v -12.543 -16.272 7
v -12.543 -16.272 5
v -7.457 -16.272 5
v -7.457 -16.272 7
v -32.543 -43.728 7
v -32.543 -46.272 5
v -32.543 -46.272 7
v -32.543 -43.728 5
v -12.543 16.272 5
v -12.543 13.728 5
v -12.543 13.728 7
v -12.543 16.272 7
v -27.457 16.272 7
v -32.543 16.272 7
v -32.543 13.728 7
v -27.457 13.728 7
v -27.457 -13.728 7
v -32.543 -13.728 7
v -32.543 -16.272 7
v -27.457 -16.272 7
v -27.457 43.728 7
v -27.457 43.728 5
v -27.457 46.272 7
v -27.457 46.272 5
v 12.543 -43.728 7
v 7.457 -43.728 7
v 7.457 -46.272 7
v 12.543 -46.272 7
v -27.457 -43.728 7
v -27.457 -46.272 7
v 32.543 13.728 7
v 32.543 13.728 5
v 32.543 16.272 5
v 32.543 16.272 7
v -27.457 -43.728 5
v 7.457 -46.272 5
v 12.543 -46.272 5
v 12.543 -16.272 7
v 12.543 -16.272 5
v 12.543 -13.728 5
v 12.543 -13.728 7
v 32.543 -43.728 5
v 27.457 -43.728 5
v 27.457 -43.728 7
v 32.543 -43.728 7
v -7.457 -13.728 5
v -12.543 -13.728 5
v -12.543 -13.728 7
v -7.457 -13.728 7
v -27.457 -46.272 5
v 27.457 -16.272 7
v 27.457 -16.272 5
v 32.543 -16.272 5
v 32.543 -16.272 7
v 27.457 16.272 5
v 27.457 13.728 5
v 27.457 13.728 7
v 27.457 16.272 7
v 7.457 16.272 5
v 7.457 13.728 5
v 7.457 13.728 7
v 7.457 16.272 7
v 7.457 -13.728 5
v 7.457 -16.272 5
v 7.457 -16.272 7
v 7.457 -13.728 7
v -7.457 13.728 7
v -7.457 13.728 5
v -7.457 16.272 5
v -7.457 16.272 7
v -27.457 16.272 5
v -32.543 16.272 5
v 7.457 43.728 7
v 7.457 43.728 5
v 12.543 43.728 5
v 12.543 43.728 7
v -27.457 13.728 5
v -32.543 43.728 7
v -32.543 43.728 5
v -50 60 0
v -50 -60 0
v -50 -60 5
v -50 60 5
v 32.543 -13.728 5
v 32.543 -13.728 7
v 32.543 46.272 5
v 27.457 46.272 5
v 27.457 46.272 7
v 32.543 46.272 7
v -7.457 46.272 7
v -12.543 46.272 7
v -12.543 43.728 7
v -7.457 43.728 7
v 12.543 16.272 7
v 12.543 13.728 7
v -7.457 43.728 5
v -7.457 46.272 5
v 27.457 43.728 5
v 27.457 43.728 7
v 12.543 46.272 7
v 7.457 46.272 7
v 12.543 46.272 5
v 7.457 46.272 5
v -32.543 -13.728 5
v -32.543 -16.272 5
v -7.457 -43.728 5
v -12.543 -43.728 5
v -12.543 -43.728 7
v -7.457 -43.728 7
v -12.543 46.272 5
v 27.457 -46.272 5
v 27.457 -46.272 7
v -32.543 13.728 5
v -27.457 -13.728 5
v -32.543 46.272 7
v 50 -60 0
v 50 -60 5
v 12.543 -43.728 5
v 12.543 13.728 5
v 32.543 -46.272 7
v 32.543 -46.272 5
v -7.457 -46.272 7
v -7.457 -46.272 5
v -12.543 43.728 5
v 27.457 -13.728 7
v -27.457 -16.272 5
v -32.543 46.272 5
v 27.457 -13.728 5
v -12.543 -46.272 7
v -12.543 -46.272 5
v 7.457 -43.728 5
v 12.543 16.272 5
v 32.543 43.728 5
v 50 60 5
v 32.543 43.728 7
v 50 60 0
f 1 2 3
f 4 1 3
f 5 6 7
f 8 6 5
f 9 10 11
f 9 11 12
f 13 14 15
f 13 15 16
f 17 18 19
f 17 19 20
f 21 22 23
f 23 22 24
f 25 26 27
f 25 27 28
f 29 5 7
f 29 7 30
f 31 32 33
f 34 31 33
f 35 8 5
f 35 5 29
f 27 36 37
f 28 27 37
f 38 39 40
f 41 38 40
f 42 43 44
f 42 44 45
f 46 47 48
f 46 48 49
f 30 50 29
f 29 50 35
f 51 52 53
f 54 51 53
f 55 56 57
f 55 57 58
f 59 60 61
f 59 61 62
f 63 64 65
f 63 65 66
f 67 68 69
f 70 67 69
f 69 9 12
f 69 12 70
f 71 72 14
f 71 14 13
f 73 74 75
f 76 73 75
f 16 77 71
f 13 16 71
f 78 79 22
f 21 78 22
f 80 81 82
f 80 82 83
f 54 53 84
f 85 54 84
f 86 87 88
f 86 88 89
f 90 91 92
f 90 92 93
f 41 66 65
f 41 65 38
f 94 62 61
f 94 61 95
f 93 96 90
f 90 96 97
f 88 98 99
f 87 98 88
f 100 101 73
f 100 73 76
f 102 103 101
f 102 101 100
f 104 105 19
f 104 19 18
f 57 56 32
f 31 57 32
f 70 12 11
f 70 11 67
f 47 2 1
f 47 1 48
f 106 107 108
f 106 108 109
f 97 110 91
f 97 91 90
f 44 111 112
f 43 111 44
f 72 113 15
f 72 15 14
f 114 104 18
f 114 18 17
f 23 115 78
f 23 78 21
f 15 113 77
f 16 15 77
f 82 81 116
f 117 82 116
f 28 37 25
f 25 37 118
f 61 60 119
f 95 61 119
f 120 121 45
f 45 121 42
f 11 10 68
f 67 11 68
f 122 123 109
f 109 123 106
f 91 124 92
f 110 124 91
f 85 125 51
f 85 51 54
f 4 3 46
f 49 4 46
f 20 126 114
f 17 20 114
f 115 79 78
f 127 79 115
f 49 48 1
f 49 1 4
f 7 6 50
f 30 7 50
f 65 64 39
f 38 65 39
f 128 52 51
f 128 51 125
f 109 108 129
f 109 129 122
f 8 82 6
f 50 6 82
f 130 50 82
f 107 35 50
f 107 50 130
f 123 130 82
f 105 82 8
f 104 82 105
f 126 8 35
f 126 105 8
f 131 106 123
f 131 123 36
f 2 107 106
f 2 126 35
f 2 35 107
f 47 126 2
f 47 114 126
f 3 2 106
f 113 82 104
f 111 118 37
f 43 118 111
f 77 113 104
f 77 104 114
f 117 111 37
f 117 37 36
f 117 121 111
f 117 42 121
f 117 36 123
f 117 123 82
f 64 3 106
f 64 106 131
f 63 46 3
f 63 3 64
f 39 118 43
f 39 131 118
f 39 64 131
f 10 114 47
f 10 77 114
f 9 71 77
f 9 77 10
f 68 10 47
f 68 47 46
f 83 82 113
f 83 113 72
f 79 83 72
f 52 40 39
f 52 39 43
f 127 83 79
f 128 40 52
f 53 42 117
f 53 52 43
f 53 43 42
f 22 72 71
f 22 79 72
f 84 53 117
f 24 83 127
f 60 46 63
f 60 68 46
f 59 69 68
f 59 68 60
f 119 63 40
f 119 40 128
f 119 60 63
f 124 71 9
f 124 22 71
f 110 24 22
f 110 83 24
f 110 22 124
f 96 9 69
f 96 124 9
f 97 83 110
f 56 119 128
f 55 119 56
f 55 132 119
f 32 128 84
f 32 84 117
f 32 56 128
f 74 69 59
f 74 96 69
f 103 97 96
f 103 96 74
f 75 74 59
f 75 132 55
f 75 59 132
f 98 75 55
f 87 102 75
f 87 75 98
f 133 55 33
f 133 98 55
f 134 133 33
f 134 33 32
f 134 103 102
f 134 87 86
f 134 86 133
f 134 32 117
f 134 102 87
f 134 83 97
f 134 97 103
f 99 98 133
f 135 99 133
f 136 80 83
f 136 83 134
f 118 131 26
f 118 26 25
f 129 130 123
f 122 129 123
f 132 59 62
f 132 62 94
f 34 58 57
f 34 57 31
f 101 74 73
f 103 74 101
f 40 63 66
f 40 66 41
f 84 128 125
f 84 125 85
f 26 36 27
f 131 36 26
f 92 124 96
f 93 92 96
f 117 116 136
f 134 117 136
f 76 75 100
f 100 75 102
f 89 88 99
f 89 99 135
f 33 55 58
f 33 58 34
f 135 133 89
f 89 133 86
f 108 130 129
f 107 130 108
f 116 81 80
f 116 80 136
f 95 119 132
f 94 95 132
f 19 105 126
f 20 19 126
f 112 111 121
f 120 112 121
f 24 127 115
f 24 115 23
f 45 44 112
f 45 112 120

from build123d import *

# Parameters (mm, degrees)
SKETCH_1_W      = 100
SKETCH_1_H      = 120
EXTRUDE_1_DEPTH = 5
SKETCH_2_W      = 5.086017552
SKETCH_2_H      = 2.543008776
EXTRUDE_2_DEPTH = 2


with BuildPart() as part:
    # 草图1 → 凸台-拉伸1 (new body)
    with BuildSketch(Plane.XY):
        Rectangle(SKETCH_1_W, SKETCH_1_H)
    extrude(amount=EXTRUDE_1_DEPTH)

    # 草图2 → 凸台-拉伸2 (add)
    with BuildSketch(Plane.XY.offset(5)):
        with Locations((-10, 45)):
            Rectangle(SKETCH_2_W, SKETCH_2_H)
        with Locations((-30, 45)):
            Rectangle(SKETCH_2_W, SKETCH_2_H)
        with Locations((10, 45)):
            Rectangle(SKETCH_2_W, SKETCH_2_H)
        with Locations((30, 45)):
            Rectangle(SKETCH_2_W, SKETCH_2_H)
        with Locations((-30, 15)):
            Rectangle(SKETCH_2_W, SKETCH_2_H)
        with Locations((-10, 15)):
            Rectangle(SKETCH_2_W, SKETCH_2_H)
        with Locations((10, 15)):
            Rectangle(SKETCH_2_W, SKETCH_2_H)
        with Locations((30, 15)):
            Rectangle(SKETCH_2_W, SKETCH_2_H)
        with Locations((-30, -15)):
            Rectangle(SKETCH_2_W, SKETCH_2_H)
        with Locations((-10, -15)):
            Rectangle(SKETCH_2_W, SKETCH_2_H)
        with Locations((10, -15)):
            Rectangle(SKETCH_2_W, SKETCH_2_H)
        with Locations((30, -15)):
            Rectangle(SKETCH_2_W, SKETCH_2_H)
        with Locations((-30, -45)):
            Rectangle(SKETCH_2_W, SKETCH_2_H)
        with Locations((-10, -45)):
            Rectangle(SKETCH_2_W, SKETCH_2_H)
        with Locations((10, -45)):
            Rectangle(SKETCH_2_W, SKETCH_2_H)
        with Locations((30, -45)):
            Rectangle(SKETCH_2_W, SKETCH_2_H)
    extrude(amount=EXTRUDE_2_DEPTH)


solid = part.part
